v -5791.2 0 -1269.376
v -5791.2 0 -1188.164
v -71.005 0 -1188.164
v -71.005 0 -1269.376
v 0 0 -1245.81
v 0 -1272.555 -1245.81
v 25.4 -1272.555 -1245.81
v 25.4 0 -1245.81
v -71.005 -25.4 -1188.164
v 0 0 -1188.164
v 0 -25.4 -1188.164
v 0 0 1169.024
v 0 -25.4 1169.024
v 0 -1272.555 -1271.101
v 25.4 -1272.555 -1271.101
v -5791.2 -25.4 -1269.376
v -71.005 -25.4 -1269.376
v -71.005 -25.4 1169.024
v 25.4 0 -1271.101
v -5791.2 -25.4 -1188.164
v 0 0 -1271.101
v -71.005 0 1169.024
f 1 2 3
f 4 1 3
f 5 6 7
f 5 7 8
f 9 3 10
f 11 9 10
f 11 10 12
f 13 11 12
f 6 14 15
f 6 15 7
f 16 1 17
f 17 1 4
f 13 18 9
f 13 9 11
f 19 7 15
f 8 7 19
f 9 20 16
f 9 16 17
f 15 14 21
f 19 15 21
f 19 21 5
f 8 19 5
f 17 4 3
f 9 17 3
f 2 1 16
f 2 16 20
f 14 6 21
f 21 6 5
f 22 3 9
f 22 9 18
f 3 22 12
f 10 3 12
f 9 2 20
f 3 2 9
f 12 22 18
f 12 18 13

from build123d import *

# Parameters (mm, degrees)
F0_W     = 71.0048
F0_H     = 2357.187629
F1_DEPTH = 25.4
F0_W_2   = 5720.1952
F0_H_2   = 81.212371
F2_DEPTH = 25.4
F3_W     = 1272.554874
F3_H     = 25.291086
F4_DEPTH = 25.4


with BuildPart() as f1:
    # F0 (on Front) → F1 (new body)
    with BuildSketch(Plane.XZ):
        with Locations((-35.5024, -9.570301)):
            Rectangle(F0_W, F0_H)
    extrude(amount=F1_DEPTH)


with BuildPart() as f2:
    # F0 (on Front) → F2 (new body)
    with BuildSketch(Plane.XZ):
        with Locations((-2931.1024, -1228.7703)):
            Rectangle(F0_W_2, F0_H_2)
    extrude(amount=F2_DEPTH)


with BuildPart() as f4:
    # F3 (on Right) → F4 (new body)
    with BuildSketch(Plane.YZ):
        with Locations((-636.277437, -1258.455813)):
            Rectangle(F3_W, F3_H)
    extrude(amount=F4_DEPTH)


solid = Compound([f1.part, f2.part, f4.part])
